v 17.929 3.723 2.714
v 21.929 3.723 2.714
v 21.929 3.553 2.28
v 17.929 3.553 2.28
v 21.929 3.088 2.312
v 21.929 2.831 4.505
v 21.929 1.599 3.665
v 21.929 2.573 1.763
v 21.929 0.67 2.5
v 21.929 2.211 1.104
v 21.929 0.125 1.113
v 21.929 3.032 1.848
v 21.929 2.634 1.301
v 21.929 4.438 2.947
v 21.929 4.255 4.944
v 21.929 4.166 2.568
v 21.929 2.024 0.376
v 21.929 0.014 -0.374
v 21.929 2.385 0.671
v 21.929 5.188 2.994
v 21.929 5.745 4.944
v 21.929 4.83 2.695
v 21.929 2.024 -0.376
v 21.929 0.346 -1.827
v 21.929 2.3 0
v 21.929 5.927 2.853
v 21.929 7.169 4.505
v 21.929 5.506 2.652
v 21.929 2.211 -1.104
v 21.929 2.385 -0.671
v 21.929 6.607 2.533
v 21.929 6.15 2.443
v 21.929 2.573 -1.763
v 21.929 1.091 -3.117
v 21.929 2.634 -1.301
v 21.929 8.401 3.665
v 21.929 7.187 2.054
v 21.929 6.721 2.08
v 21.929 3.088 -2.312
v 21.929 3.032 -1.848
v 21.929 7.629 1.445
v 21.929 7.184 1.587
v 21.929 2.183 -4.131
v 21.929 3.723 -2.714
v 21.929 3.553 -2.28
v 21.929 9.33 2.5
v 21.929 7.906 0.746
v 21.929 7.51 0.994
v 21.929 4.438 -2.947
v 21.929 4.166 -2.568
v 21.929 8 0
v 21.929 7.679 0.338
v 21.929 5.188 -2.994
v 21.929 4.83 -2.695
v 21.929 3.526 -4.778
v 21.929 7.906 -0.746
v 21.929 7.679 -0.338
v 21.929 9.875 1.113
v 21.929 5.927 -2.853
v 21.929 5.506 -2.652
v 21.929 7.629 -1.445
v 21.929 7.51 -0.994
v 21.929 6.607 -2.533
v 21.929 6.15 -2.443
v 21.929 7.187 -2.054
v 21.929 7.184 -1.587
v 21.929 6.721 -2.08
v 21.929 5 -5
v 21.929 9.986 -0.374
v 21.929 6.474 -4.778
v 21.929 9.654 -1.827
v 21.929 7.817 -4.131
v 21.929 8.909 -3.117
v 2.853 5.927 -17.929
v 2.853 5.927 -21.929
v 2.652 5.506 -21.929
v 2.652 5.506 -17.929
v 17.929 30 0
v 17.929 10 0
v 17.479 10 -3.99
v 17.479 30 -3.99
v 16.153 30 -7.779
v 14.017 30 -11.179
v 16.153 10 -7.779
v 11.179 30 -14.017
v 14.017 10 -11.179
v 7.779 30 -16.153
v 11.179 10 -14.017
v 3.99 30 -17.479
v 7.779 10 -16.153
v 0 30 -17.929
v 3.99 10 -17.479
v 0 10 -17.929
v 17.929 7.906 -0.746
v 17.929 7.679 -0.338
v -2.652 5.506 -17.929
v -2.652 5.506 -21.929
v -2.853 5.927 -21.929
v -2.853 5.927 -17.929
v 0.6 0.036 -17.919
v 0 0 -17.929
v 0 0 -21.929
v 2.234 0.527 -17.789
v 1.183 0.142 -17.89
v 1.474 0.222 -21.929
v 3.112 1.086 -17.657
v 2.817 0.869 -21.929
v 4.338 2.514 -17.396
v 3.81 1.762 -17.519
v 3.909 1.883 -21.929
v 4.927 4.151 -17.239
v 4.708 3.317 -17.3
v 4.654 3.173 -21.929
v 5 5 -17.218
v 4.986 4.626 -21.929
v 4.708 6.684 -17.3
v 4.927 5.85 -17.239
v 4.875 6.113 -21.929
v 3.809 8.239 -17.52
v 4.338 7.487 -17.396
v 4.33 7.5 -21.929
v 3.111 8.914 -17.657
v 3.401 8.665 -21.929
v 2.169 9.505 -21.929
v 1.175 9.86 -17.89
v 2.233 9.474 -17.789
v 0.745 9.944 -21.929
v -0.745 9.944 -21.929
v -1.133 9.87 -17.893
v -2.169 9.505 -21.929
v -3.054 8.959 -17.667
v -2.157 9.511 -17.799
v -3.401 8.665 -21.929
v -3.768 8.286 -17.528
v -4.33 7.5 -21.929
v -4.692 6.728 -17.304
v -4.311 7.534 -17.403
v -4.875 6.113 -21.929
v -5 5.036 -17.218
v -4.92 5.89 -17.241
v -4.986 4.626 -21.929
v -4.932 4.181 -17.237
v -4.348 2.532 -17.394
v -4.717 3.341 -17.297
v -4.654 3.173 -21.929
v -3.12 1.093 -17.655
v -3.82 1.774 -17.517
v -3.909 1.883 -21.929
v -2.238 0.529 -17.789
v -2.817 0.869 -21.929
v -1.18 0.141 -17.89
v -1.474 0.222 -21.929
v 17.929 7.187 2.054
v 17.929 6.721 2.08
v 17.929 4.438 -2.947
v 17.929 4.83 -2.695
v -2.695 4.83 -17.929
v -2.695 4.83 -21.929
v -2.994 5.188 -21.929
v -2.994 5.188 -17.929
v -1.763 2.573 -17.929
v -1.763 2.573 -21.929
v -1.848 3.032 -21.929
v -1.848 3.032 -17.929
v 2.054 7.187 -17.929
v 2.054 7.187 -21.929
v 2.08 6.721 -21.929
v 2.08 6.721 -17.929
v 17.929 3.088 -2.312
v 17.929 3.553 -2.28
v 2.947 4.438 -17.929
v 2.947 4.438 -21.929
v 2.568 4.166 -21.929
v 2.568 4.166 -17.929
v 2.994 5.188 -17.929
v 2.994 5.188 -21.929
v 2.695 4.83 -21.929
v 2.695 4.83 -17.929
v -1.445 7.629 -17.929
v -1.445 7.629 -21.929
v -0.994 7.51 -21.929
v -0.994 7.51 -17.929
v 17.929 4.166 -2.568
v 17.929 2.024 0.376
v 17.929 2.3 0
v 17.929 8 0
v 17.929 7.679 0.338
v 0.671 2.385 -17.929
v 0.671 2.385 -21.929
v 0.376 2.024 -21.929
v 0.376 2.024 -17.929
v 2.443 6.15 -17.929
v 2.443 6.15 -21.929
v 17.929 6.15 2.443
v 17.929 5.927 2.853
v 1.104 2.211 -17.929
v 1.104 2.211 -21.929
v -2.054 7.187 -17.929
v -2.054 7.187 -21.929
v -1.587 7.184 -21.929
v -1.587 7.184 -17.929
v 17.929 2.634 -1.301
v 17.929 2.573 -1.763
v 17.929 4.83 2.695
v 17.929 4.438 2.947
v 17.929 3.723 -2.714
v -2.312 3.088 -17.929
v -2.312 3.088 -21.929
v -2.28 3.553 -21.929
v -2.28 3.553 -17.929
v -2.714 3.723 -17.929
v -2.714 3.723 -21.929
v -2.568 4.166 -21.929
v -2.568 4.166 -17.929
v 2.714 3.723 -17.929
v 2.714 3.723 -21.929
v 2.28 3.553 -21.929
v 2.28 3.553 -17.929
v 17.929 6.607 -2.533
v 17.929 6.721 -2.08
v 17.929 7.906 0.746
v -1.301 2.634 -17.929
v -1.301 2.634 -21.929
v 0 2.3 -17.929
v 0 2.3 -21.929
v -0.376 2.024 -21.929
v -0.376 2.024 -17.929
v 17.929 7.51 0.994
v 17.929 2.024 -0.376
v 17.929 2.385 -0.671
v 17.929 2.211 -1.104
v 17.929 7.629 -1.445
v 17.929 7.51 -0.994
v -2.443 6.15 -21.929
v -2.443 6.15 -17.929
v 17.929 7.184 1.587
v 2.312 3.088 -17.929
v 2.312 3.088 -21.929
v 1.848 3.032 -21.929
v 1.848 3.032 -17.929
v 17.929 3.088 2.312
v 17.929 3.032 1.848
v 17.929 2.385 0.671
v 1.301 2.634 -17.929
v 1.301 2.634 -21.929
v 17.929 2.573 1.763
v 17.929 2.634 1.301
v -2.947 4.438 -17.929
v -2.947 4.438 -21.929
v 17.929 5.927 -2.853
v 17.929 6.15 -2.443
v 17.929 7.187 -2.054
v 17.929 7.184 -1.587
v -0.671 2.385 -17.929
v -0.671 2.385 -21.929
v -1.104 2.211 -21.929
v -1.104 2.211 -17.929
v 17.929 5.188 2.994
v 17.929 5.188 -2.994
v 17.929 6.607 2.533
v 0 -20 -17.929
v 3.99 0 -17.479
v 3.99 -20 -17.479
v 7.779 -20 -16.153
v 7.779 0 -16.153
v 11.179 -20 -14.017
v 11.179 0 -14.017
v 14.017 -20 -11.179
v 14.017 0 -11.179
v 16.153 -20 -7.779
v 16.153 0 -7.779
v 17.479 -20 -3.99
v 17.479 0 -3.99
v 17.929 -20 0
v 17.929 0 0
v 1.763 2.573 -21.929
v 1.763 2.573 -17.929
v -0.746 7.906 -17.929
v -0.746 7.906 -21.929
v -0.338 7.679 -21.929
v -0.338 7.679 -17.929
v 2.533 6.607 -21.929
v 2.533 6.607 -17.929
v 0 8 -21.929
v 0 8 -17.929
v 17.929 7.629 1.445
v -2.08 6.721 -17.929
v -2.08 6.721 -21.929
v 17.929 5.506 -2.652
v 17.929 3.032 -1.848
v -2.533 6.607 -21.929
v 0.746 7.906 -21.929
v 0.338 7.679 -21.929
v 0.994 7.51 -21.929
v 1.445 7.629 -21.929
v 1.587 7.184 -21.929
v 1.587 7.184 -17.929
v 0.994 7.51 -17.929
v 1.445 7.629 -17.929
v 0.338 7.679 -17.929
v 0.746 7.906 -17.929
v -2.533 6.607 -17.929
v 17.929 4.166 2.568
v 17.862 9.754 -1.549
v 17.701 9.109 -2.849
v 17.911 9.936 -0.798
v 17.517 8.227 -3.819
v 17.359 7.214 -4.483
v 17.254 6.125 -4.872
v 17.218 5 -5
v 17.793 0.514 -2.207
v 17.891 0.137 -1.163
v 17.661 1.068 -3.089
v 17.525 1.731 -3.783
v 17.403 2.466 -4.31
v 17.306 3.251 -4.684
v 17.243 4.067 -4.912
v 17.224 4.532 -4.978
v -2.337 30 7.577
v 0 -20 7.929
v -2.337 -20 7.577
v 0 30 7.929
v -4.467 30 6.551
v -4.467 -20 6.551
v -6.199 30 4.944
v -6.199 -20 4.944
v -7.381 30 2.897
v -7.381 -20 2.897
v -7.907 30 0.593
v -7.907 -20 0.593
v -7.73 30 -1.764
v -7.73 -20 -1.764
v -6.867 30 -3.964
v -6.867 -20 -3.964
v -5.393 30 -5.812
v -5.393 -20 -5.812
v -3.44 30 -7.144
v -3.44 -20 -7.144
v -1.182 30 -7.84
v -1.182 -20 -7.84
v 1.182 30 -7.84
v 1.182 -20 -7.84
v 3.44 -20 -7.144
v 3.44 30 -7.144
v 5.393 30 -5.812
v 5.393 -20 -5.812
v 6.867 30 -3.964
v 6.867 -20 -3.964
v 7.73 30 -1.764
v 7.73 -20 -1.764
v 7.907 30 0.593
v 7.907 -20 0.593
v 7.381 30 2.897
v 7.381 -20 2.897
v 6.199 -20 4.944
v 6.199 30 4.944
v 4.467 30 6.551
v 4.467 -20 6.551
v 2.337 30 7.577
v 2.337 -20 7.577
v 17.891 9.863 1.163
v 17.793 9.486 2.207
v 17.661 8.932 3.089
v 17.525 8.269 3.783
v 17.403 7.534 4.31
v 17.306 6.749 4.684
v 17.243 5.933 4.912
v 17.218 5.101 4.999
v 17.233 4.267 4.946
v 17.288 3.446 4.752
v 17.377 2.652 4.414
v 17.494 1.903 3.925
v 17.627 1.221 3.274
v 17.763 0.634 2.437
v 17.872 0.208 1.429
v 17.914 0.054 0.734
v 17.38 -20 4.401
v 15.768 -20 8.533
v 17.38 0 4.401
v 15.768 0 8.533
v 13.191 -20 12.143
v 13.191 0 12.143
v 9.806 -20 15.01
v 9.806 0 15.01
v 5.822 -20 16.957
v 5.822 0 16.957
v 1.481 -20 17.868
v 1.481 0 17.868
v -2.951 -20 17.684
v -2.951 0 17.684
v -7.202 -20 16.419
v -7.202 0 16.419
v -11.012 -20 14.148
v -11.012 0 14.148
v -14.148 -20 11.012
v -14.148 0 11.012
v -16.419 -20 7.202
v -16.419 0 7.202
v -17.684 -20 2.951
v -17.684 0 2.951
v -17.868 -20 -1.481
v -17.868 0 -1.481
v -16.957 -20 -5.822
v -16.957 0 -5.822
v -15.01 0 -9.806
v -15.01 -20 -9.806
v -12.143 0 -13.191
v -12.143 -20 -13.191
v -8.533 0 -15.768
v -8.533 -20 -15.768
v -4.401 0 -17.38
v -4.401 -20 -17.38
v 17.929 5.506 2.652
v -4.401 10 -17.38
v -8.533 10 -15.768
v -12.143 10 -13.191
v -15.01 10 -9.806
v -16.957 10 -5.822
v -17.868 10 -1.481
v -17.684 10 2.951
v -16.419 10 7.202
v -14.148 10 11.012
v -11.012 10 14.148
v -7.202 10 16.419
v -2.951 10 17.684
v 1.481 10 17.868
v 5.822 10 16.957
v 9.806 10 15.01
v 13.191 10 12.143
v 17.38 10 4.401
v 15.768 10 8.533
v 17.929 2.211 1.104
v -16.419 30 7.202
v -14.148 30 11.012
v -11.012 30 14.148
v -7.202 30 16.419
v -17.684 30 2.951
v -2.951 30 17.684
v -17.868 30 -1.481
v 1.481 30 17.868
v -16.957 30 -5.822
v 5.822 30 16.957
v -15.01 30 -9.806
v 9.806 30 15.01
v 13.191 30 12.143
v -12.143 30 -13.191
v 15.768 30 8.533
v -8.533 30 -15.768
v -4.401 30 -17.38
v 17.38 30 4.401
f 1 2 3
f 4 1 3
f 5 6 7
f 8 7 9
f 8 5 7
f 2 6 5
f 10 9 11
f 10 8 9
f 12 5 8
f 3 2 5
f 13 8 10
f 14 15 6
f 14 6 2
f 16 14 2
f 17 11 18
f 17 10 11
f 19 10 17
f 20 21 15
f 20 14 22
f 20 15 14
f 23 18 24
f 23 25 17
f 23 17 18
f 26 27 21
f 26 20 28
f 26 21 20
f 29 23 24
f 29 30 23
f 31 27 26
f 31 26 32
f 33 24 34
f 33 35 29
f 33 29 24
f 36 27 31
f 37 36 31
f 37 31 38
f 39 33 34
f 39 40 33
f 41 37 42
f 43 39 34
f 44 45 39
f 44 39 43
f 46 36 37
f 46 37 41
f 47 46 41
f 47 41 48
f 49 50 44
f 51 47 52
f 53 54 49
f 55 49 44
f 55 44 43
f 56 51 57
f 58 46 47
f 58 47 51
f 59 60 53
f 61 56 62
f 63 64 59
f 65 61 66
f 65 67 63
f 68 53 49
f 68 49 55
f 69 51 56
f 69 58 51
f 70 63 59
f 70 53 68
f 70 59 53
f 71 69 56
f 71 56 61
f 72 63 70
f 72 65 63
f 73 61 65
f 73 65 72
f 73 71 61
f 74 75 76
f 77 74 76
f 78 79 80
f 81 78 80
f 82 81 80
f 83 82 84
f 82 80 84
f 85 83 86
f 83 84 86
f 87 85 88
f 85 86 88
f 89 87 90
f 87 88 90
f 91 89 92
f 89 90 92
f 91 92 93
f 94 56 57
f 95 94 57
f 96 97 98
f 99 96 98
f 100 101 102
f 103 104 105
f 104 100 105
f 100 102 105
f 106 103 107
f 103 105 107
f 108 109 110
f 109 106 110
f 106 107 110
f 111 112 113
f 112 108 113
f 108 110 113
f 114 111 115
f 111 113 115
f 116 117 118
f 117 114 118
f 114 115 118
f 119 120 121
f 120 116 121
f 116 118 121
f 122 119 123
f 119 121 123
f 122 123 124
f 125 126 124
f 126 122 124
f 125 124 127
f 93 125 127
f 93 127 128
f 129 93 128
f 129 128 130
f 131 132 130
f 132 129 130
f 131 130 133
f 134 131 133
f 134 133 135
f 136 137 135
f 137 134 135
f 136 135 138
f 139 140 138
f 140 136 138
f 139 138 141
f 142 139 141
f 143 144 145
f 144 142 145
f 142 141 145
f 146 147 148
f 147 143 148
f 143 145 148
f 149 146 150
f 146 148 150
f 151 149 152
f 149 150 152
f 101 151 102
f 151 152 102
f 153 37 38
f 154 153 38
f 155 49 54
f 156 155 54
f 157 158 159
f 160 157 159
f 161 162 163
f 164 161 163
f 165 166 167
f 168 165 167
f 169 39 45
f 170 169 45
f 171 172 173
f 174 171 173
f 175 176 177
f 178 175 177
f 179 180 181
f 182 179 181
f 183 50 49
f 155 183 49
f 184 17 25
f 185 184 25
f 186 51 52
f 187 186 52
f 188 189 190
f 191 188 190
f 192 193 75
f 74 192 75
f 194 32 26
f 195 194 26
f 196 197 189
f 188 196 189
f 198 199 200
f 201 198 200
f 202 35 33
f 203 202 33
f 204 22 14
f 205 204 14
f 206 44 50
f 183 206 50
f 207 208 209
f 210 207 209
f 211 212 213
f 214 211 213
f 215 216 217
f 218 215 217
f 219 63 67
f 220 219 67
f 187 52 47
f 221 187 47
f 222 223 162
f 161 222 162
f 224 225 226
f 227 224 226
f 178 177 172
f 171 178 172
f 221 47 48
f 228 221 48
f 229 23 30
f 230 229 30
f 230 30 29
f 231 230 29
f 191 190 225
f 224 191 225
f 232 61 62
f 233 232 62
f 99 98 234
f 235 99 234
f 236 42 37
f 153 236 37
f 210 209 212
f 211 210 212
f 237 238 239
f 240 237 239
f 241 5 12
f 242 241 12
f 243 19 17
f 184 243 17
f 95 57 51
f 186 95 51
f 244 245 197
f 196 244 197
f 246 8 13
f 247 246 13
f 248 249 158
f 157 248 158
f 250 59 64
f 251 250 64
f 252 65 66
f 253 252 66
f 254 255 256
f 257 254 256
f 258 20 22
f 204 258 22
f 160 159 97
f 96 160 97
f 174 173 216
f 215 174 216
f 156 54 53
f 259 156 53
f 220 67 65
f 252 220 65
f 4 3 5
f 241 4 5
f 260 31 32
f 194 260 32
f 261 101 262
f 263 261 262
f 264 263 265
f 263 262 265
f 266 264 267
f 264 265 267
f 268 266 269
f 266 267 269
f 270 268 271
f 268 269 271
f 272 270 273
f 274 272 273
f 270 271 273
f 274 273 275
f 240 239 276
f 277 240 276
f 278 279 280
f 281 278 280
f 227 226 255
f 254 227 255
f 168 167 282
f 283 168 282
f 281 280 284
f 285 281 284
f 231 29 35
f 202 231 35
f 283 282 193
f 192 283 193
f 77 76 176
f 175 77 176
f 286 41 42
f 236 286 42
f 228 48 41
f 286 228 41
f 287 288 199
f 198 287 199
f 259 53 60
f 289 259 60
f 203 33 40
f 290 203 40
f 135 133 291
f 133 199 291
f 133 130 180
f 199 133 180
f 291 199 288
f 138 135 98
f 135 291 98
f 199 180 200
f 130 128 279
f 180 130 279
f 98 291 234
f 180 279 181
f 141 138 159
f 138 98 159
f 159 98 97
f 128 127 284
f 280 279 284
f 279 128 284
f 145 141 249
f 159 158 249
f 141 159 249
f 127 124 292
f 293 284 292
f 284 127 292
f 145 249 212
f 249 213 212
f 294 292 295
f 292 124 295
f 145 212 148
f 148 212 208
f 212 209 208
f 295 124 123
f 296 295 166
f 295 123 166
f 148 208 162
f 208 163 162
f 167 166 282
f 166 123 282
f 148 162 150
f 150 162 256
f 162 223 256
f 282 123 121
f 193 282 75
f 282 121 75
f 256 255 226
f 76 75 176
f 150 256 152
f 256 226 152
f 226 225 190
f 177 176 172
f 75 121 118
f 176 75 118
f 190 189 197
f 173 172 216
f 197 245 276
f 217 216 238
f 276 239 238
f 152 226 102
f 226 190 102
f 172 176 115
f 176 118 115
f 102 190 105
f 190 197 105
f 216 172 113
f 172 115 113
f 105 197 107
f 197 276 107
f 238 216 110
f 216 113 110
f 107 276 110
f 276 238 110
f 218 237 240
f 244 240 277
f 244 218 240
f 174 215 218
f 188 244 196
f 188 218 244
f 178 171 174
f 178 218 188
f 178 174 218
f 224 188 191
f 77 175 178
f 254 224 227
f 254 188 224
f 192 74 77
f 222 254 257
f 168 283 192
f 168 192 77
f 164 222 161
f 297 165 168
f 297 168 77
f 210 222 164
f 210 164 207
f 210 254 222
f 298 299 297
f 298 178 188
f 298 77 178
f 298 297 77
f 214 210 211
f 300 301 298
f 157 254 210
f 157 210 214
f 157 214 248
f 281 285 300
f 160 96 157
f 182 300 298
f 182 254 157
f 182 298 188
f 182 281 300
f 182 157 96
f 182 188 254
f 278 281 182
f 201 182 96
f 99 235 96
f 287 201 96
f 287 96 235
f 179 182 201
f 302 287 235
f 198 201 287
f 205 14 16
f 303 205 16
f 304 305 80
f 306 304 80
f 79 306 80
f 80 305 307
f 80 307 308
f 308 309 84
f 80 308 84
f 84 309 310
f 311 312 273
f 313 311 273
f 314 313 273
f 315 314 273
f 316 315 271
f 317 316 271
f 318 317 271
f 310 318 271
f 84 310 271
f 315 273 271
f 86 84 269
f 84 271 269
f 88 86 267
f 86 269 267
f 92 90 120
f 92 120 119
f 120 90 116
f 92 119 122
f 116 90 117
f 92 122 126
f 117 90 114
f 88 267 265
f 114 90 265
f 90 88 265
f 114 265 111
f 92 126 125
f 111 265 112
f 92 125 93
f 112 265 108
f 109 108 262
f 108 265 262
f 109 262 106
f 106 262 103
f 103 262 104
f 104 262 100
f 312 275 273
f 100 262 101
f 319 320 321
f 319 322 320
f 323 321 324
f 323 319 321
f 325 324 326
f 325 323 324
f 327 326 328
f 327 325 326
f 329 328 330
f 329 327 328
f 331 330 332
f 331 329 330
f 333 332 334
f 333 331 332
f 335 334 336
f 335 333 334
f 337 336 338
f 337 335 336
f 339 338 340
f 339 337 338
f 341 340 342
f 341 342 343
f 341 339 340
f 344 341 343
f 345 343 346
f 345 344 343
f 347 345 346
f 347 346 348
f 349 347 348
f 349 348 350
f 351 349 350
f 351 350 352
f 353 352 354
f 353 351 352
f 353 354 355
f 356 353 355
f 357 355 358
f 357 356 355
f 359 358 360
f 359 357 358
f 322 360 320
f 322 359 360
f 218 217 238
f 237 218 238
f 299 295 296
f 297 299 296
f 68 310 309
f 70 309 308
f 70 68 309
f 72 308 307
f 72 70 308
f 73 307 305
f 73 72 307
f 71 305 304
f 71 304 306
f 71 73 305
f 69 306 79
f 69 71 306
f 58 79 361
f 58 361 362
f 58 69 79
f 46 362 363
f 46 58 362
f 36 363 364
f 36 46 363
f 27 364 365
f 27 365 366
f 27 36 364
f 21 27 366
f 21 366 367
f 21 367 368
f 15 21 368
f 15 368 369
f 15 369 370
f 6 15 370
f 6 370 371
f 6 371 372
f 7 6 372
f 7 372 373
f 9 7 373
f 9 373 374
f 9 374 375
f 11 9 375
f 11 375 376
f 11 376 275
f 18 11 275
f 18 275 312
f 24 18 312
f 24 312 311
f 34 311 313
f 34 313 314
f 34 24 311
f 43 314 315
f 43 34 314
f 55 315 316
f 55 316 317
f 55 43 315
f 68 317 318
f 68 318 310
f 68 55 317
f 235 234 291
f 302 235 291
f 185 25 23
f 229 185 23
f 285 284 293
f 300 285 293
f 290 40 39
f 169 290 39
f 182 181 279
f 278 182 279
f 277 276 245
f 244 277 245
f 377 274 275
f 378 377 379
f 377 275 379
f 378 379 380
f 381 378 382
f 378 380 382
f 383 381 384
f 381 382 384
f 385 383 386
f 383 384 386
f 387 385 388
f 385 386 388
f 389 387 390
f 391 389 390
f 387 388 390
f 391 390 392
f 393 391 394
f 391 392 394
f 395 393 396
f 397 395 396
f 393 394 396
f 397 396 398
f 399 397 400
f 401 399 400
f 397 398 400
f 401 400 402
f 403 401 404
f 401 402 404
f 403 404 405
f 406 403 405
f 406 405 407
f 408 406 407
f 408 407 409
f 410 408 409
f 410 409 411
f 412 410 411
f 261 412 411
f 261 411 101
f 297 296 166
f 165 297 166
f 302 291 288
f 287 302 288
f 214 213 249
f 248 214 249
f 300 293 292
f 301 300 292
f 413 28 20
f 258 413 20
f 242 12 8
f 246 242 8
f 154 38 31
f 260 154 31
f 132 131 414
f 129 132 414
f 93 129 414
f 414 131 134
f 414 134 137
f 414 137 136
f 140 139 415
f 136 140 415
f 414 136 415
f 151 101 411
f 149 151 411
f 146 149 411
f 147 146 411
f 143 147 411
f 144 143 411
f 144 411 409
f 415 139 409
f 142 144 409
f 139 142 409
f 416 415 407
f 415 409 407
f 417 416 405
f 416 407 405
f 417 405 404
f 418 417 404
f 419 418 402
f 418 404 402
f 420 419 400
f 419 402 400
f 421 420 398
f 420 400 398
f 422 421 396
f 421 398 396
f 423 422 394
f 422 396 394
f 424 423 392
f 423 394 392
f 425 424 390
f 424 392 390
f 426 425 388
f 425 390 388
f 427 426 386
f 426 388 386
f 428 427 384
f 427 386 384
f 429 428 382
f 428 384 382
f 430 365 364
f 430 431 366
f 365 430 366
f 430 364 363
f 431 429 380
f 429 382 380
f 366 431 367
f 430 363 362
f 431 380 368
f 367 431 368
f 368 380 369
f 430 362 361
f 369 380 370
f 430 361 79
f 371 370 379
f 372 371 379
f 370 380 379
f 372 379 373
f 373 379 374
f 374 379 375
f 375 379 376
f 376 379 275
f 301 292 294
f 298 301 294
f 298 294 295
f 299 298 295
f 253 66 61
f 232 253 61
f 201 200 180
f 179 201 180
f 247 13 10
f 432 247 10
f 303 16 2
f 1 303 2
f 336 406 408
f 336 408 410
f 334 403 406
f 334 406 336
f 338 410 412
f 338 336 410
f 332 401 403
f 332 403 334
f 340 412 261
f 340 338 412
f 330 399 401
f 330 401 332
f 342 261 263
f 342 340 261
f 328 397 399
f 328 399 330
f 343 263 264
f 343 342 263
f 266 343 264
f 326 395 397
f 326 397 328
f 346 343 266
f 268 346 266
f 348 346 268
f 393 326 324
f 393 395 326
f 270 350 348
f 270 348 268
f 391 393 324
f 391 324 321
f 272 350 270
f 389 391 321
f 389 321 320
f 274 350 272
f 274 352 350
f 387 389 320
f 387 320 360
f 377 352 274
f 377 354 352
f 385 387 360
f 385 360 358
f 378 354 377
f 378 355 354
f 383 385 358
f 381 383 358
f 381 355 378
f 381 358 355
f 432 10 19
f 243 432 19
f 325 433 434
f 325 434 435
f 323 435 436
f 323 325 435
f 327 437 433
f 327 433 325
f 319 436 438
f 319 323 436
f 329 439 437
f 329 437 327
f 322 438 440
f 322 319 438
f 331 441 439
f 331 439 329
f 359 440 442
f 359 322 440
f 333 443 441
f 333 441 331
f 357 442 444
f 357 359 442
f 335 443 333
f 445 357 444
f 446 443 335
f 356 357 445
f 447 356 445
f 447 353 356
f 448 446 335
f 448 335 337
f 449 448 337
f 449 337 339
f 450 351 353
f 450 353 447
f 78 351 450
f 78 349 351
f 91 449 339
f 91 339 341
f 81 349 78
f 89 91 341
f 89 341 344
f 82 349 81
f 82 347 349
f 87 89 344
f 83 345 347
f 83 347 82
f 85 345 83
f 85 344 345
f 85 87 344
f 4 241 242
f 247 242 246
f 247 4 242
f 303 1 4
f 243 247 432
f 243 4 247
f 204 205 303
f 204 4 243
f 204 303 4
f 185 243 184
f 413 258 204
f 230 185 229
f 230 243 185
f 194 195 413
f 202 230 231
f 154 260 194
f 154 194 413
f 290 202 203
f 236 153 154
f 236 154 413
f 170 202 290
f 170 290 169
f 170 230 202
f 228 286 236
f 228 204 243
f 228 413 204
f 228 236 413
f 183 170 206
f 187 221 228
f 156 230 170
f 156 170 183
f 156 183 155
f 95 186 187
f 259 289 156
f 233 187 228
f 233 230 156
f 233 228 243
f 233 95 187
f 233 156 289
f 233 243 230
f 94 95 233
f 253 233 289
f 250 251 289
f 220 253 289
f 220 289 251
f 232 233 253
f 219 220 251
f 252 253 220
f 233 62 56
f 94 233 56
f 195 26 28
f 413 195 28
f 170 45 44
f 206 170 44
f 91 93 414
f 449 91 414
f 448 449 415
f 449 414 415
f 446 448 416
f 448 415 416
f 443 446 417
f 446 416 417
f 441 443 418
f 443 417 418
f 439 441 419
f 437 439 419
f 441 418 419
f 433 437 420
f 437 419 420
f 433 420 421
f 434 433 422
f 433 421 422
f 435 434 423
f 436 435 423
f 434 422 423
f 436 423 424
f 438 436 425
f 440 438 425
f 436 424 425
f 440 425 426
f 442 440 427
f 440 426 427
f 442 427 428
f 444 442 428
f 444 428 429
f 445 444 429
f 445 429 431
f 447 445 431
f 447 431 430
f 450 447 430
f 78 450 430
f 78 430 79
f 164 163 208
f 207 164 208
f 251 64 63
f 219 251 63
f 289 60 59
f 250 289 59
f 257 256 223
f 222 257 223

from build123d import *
from build123d.topology import SkipClean

# Parameters (mm, degrees)
SKETCH1_R                = 17.928932
BOSS_EXTRUDE1_DEPTH      = 10
SKETCH2_R                = 7.928932
CUT_EXTRUDE1_DEPTH       = 28.256068
BOSS_EXTRUDE2_REACH      = 46.834
BOSS_EXTRUDE2_END_RADIUS = 17.928932
SKETCH4_R                = 5
BOSS_EXTRUDE5_REACH      = 48.578
BOSS_EXTRUDE5_END_RADIUS = 17.928932
SKETCH11_R               = 5
CUT_EXTRUDE5_DEPTH       = 4
CIRPATTERN1_COUNT        = 2
CIRPATTERN1_ANGLE        = 270
SKETCH21_R               = 7.928932
BOSS_EXTRUDE6_DEPTH      = 20
SKETCH22_R               = 7.928932
BOSS_EXTRUDE7_DEPTH      = 20


with BuildPart() as part:
    # Sketch1 → Boss-Extrude1 (new body)
    with BuildSketch(Plane(origin=(0, 0, 0), x_dir=(1, 0, 0), z_dir=(0, 1, 0))):
        with Locations(Location((0, 0, 0), (0, 0, 270))):
            Circle(SKETCH1_R)
    extrude(amount=BOSS_EXTRUDE1_DEPTH)

    # Sketch2 → Cut-Extrude1 (cut, through all)
    with BuildSketch(Plane(origin=(0, 10, 0), x_dir=(1, 0, 0), z_dir=(0, 1, 0))):
        with Locations(Location((0, 0, 0), (0, 0, 270))):
            Circle(SKETCH2_R)
    extrude(amount=-CUT_EXTRUDE1_DEPTH, mode=Mode.SUBTRACT)

    # Boss-Extrude2: up to this cylinder (the profile starts outside it)
    with SkipClean():  # the faces are left unmerged after this step: merging them gives an invalid solid
        boss_extrude2_end = Plane(origin=(0, 5, 0), z_dir=(0, -1, 0)) * Cylinder(BOSS_EXTRUDE2_END_RADIUS, 130.525864, mode=Mode.PRIVATE)
        # Sketch4 → Boss-Extrude2 (add, up to the surface)
        with BuildSketch(Plane(origin=(21.928932, 0, 0), x_dir=(0, 0, -1), z_dir=(1, 0, 0)), mode=Mode.PRIVATE) as boss_extrude2_sk1:
            with Locations((0, 5)):
                Circle(SKETCH4_R)
        boss_extrude2_tool1 = extrude(boss_extrude2_sk1.sketch, amount=-BOSS_EXTRUDE2_REACH, mode=Mode.PRIVATE) - boss_extrude2_end
        add(boss_extrude2_tool1.solids().sort_by_distance((21.928932, 5, 0))[0])

    # Boss-Extrude5: up to this cylinder (the profile starts outside it)
    boss_extrude5_end = Plane(origin=(0, 5, 0), z_dir=(0, -1, 0)) * Cylinder(BOSS_EXTRUDE5_END_RADIUS, 134.013864, mode=Mode.PRIVATE)
    # Sketch11 → Boss-Extrude5 (add, up to the surface)
    with BuildSketch(Plane.XY.offset(-21.928932), mode=Mode.PRIVATE) as boss_extrude5_sk1:
        with Locations(Location((0, 5, 0), (0, 0, 270))):
            Circle(SKETCH11_R)
    boss_extrude5_tool1 = extrude(boss_extrude5_sk1.sketch, amount=BOSS_EXTRUDE5_REACH, mode=Mode.PRIVATE) - boss_extrude5_end
    add(boss_extrude5_tool1.solids().sort_by_distance((0, 5, -21.928932))[0])

    # Sketch14 → Cut-Extrude5 (cut)
    with BuildSketch(Plane(origin=(0, 0, -21.928932), x_dir=(-1, 0, 0), z_dir=(0, 0, -1))):
        Polygon((0, 8), (-0.33838, 7.678553), (-0.74607, 7.905749), (-0.993878, 7.510249), (-1.445261, 7.62892), (-1.586927, 7.184218), (-2.053641, 7.186906), (-2.080264, 6.720944), (-2.532984, 6.60748), (-2.44289, 6.149537), (-2.85317, 5.927051), (-2.65202, 5.5059), (-2.99408, 5.188372), (-2.694514, 4.830476), (-2.946862, 4.437856), (-2.567702, 4.165703), (-2.714481, 3.722662), (-2.279552, 3.553353), (-2.31154, 3.087728), (-1.848169, 3.0319), (-1.763356, 2.572949), (-1.300659, 2.634111), (-1.104374, 2.210671), (-0.671423, 2.384979), (-0.376, 2.023656), (0, 2.300158), (0.376, 2.023656), (0.671423, 2.384979), (1.104374, 2.210671), (1.300659, 2.634111), (1.763356, 2.572949), (1.848169, 3.0319), (2.31154, 3.087728), (2.279552, 3.553353), (2.714481, 3.722662), (2.567702, 4.165703), (2.946862, 4.437856), (2.694514, 4.830476), (2.99408, 5.188372), (2.65202, 5.5059), (2.85317, 5.927051), (2.44289, 6.149537), (2.532984, 6.60748), (2.080264, 6.720944), (2.053641, 7.186906), (1.586927, 7.184218), (1.445261, 7.62892), (0.993878, 7.510249), (0.74607, 7.905749), (0.33838, 7.678553), align=None)
    cut_extrude5 = extrude(amount=-CUT_EXTRUDE5_DEPTH, mode=Mode.SUBTRACT)

    # CirPattern1: Cut-Extrude5 ×2 about axis
    cirpattern1_axis = Axis((0, 0, 0), (0, 1, 0))
    for i in range(1, CIRPATTERN1_COUNT):
        add(cut_extrude5.rotate(cirpattern1_axis, i * CIRPATTERN1_ANGLE / (CIRPATTERN1_COUNT - 1)), mode=Mode.SUBTRACT)

    # Sketch21 → Boss-Extrude6 (add)
    with BuildSketch(Plane(origin=(0, 10, 0), x_dir=(1, 0, 0), z_dir=(0, 1, 0))):
        with BuildLine():
            ThreePointArc((17.928932, 0), (12.67767, 12.67767), (0, 17.928932))
            ThreePointArc((0, 17.928932), (-12.67767, -12.67767), (17.928932, 0))
        make_face()
        with Locations(Location((0, 0, 0), (0, 0, 270))):
            Circle(SKETCH21_R, mode=Mode.SUBTRACT)
    extrude(amount=BOSS_EXTRUDE6_DEPTH)

    # Sketch22 → Boss-Extrude7 (add)
    with BuildSketch(Plane.XZ):
        with BuildLine():
            ThreePointArc((0, -17.928932), (12.67767, -12.67767), (17.928932, 0))
            ThreePointArc((17.928932, 0), (-12.67767, 12.67767), (0, -17.928932))
        make_face()
        with Locations(Location((0, 0, 0), (0, 0, 90))):
            Circle(SKETCH22_R, mode=Mode.SUBTRACT)
    extrude(amount=BOSS_EXTRUDE7_DEPTH)


solid = part.part
